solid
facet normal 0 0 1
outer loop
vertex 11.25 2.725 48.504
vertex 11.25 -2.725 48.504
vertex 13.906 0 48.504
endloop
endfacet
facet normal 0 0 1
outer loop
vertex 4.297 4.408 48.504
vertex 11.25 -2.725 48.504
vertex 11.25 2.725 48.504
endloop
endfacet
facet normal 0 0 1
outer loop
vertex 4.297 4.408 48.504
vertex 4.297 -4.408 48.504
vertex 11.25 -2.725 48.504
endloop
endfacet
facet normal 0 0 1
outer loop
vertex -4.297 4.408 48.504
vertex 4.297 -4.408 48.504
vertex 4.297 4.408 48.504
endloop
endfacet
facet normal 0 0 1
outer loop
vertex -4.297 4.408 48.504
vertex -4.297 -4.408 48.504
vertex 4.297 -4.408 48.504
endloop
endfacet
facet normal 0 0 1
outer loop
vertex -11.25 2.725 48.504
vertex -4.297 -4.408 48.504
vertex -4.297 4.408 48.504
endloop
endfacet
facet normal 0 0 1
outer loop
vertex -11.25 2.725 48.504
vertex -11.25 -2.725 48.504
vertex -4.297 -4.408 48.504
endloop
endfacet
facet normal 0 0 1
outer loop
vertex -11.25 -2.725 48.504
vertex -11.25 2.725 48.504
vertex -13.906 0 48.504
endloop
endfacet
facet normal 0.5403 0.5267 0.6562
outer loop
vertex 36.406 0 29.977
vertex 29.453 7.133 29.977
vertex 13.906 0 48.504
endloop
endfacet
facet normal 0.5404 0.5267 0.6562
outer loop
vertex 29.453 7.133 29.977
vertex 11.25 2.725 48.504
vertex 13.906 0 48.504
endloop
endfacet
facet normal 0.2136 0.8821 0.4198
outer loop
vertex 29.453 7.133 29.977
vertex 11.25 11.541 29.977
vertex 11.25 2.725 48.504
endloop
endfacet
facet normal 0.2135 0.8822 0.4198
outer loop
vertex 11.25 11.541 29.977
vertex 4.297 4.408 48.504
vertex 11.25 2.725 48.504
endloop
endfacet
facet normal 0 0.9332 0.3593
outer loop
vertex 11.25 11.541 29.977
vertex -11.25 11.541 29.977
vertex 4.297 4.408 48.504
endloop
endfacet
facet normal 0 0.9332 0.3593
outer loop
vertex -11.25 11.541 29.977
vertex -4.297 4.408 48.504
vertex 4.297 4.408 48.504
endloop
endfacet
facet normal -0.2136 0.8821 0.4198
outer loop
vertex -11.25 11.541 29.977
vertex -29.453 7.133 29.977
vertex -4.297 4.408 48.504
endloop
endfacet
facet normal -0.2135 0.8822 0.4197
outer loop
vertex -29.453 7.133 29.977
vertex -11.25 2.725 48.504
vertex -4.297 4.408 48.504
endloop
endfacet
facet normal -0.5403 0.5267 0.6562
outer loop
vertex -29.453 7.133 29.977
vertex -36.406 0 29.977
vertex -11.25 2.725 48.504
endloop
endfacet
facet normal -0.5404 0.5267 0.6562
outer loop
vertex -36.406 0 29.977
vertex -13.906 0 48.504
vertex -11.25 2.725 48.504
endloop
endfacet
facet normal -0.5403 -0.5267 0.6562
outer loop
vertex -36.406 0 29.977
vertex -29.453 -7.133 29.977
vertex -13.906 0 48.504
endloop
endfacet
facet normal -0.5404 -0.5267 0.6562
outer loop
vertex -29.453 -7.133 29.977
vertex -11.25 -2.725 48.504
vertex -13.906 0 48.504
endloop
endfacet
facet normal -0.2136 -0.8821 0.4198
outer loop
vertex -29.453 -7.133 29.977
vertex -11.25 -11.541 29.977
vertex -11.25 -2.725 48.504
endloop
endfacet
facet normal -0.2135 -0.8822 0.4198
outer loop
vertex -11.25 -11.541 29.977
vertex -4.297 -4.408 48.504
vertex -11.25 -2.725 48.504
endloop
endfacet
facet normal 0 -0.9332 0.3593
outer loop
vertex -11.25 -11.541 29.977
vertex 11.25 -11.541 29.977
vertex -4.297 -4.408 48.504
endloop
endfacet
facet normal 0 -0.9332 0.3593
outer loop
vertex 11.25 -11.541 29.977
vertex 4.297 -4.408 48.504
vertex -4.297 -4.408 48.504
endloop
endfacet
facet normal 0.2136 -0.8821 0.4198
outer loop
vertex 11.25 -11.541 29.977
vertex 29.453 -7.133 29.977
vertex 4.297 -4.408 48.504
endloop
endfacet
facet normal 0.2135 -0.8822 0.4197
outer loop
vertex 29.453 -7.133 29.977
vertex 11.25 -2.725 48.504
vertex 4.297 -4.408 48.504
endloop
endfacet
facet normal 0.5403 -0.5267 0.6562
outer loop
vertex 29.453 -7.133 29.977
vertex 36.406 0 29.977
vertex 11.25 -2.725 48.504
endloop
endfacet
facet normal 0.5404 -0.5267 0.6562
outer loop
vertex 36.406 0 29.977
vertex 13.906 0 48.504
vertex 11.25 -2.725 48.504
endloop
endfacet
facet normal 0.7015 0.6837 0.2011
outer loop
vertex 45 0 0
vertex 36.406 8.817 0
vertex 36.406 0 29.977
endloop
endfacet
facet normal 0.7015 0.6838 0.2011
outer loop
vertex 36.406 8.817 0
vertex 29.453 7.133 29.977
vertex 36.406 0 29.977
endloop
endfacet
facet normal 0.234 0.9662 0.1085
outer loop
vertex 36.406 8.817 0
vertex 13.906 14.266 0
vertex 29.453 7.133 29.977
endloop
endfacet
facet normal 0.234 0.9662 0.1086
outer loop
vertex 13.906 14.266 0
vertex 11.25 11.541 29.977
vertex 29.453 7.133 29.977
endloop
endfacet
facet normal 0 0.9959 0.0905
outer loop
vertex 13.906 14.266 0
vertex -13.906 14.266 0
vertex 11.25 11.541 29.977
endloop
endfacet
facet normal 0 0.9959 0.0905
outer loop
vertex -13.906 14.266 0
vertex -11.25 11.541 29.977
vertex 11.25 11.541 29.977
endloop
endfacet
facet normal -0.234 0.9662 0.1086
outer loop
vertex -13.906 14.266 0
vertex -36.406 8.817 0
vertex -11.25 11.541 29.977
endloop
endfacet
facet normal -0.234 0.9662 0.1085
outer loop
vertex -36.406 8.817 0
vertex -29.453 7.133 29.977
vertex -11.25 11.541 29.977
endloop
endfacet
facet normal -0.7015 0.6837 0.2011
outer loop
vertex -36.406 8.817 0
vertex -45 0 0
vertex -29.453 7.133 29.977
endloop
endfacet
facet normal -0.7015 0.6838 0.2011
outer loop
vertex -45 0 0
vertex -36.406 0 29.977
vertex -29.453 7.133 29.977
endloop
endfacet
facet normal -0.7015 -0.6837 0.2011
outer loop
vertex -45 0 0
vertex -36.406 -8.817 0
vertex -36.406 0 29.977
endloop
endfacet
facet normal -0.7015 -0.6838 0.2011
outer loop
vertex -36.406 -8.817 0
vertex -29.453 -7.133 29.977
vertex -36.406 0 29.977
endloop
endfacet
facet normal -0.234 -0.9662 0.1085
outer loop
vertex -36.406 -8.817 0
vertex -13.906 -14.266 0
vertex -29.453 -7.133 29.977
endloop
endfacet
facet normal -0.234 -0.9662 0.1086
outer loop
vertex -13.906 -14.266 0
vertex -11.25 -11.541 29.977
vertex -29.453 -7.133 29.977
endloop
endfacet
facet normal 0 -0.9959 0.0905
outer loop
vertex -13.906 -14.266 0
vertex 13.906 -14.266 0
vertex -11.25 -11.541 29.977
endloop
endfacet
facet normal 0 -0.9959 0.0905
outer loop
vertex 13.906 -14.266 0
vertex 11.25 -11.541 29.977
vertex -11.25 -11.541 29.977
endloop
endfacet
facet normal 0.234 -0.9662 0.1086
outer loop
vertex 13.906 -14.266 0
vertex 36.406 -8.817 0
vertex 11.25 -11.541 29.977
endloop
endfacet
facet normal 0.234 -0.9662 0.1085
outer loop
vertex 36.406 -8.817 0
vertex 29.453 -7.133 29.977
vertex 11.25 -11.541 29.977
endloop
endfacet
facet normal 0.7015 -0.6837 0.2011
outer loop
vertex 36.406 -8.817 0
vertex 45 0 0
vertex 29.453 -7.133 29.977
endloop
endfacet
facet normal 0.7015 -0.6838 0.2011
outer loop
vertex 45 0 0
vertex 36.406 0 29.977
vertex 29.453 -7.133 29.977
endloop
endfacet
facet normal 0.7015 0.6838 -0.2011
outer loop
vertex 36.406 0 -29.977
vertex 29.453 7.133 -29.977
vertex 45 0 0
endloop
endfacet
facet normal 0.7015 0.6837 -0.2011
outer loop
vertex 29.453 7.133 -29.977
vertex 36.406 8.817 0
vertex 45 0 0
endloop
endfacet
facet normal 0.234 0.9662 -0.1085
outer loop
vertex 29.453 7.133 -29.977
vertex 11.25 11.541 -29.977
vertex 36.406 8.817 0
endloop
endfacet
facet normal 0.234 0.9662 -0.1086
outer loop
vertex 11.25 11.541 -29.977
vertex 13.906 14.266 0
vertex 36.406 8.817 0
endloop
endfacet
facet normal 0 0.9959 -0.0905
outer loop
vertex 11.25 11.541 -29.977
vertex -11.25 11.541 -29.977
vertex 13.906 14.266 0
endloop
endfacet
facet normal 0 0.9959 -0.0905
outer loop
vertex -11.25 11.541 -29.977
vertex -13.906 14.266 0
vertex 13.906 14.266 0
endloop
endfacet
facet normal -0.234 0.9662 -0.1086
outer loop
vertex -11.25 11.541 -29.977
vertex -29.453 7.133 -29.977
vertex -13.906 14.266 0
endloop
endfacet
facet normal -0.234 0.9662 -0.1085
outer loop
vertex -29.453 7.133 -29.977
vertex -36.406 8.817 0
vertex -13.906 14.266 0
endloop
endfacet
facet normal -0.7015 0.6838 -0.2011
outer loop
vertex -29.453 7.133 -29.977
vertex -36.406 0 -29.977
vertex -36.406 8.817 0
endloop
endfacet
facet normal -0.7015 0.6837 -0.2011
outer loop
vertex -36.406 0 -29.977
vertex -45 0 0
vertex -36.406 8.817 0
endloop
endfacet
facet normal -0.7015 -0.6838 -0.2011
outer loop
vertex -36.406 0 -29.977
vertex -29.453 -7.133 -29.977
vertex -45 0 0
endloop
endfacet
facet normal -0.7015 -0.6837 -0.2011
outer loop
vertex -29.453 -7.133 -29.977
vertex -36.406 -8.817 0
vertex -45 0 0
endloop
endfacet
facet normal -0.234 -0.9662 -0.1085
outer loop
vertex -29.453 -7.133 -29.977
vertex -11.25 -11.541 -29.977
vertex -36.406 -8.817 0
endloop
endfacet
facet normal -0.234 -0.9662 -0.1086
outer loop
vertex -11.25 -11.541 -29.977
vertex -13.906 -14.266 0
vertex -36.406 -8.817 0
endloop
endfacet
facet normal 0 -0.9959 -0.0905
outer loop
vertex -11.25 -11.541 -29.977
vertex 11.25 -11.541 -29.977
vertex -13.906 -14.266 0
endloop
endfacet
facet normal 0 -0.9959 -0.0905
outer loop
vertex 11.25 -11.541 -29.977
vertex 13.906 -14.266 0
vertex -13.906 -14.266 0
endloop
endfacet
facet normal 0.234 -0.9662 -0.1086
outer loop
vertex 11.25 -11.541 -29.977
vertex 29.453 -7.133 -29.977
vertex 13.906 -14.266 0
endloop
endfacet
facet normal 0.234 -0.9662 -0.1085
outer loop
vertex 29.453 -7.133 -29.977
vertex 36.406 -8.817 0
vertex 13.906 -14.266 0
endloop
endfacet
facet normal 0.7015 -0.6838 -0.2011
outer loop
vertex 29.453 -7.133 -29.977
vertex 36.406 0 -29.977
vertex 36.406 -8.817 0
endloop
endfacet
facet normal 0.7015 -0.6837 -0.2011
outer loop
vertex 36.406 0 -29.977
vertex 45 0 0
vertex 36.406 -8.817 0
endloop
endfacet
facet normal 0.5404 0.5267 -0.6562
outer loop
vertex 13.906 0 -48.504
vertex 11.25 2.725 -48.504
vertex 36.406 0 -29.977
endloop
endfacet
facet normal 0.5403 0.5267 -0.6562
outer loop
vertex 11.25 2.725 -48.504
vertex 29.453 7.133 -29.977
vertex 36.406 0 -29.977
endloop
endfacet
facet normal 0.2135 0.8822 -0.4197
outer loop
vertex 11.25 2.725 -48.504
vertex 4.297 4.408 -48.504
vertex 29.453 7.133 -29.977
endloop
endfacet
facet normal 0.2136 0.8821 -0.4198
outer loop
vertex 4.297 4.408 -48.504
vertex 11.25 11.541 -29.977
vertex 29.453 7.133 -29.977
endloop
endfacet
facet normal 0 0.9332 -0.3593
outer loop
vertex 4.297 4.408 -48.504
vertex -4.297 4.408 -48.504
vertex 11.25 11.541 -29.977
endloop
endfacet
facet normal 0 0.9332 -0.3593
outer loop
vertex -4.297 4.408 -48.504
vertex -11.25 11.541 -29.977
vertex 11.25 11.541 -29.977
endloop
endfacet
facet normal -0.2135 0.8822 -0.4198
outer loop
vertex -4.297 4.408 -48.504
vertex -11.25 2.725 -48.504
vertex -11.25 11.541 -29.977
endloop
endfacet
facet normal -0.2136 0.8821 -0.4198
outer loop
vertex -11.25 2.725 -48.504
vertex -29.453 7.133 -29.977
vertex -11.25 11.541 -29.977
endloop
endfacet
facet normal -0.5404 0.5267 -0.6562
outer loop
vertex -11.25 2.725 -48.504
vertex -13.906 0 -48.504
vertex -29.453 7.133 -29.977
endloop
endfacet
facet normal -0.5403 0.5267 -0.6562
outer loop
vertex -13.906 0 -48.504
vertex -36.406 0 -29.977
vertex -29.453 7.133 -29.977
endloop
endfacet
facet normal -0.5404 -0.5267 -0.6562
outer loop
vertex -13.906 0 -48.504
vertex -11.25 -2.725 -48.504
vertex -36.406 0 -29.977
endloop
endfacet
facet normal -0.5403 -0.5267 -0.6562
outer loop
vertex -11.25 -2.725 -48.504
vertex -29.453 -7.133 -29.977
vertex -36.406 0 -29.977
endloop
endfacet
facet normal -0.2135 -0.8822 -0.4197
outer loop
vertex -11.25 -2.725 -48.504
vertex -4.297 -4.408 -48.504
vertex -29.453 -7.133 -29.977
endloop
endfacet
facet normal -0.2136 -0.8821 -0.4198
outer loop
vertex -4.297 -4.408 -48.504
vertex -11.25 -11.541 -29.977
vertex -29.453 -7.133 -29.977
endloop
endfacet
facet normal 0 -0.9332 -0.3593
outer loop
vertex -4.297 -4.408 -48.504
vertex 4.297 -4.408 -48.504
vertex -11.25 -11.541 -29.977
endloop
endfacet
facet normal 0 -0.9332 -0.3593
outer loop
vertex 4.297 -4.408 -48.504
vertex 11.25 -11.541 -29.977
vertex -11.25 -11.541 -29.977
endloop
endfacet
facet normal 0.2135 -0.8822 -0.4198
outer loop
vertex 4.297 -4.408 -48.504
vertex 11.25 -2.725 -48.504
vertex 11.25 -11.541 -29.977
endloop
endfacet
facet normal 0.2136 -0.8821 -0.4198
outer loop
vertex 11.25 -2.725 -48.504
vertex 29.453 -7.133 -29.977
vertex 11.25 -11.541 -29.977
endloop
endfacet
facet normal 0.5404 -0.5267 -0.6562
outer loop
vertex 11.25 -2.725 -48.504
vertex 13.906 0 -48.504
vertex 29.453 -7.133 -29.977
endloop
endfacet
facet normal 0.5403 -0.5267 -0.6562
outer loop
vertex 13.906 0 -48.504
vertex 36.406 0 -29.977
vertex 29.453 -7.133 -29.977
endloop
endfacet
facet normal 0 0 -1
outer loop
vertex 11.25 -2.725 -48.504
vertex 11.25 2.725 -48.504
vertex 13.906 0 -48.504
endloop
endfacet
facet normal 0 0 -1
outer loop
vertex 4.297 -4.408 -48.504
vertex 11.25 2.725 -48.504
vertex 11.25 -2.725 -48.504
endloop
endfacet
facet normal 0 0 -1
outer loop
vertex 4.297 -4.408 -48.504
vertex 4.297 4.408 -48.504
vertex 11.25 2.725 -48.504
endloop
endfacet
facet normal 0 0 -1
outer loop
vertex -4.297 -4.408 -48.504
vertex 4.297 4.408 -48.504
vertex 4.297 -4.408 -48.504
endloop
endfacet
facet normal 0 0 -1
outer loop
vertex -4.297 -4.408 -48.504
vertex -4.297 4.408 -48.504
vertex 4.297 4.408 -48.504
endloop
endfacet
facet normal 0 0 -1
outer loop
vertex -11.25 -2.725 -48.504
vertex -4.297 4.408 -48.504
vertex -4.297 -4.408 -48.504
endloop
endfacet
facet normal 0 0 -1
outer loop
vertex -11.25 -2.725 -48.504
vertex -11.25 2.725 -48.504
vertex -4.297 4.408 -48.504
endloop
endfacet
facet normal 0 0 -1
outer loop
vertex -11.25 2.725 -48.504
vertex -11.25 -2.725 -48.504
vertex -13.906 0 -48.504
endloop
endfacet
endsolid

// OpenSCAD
// Generated by SolidPython 1.0.1 on 2020-07-29 00:46:51


scale(v = [15, 5, 17]) {
	sphere(r = 3);
}
/***********************************************
*********      SolidPython code:      **********
************************************************
 
# import packages: SolidPython
from solid import *
from solid.utils import *
from itertools import chain, combinations, permutations


class Resize:

    def __init__(self, scad_file):
        self.scad_file = scad_file
        #self.scad_file = import_scad(scad_file)
        # cone/cylinder param:
        self.r1 = 0
        self.r2 = 0
        self.h = 0
        # rectangular prism param:
        self.w = 0
        self.l = 0
        # ellipse param:
        self.r = 0

    # import OpenScad code (file name corresponds to shape)


    # classify shape + parameters
    def assign(self, param1, param2, param3):
        if self.scad_file == 'cone.scad':
            self.r1 = param1
            self.r2 = param2
            self.h = param3
        elif self.scad_file == 'cylinder.scad':
            self.r1 = param1
            self.r2 = param2
            self.h = param3
        elif self.scad_file == 'rectangularPrism.scad':
            self.h = param1
            self.l = param2
            self.w = param3
        else:
            self.r = param1
            self.h = param2

    # resize parameters
    def iterate(self):
        x = range(3, 20, 2)
        i = 1
        if self.scad_file == 'cone.scad':
            tempList = list(permutations(x, 2))
            for temp in tempList:
                param1 = temp[0]
                param2 = temp[1]
                filepath = 'produced_scad_files/' + 'cone' + str(param1) + '_' + str(param2) + '_' + '.scad'
                scad_render_to_file(cylinder(h=param1, r1=param2, r2=0), filepath)

        elif self.scad_file == 'cylinder.scad':
            tempList = list(permutations(x, 3))
            for temp in tempList:
                param1 = temp[0]
                param2 = temp[1]
                filepath = 'produced_scad_files/' + 'cylinder' + str(param1) + '_' + str(param2) + '_' + '.scad'
                scad_render_to_file(cylinder(h=param1, r1=param2, r2=param2), filepath)

        elif self.scad_file == 'rectangularPrism.scad':
            tempList = list(permutations(x, 3))
            for temp in tempList:
                param1 = temp[0]
                param2 = temp[1]
                param3 = temp[2]
                filepath = 'produced_scad_files/' + 'rectangularPrism' + str(param1) + '_' + str(param2) + '_' + str(
                    param3) + '.scad'
                scad_render_to_file(cube(size=(param1, param2, param3)), filepath)

        elif self.scad_file == 'ellipse.scad':
            tempList = list(permutations(x, 4))
            for temp in tempList:
                param1 = temp[0]
                param2 = temp[1]
                param3 = temp[2]
                param4 = temp[3]
                filepath = 'produced_scad_files/' + 'ellipse' + str(param1) + '_' + str(param2) + '_' + str(param3) + '_' + str(param4) + '.scad'
                scad_render_to_file(scale([param1, param2, param3])(sphere(r=param4)), filepath)

    def render_to_scadfile(self):
        scad_render_to_file(scad, 'example.scad') 
 
************************************************/
